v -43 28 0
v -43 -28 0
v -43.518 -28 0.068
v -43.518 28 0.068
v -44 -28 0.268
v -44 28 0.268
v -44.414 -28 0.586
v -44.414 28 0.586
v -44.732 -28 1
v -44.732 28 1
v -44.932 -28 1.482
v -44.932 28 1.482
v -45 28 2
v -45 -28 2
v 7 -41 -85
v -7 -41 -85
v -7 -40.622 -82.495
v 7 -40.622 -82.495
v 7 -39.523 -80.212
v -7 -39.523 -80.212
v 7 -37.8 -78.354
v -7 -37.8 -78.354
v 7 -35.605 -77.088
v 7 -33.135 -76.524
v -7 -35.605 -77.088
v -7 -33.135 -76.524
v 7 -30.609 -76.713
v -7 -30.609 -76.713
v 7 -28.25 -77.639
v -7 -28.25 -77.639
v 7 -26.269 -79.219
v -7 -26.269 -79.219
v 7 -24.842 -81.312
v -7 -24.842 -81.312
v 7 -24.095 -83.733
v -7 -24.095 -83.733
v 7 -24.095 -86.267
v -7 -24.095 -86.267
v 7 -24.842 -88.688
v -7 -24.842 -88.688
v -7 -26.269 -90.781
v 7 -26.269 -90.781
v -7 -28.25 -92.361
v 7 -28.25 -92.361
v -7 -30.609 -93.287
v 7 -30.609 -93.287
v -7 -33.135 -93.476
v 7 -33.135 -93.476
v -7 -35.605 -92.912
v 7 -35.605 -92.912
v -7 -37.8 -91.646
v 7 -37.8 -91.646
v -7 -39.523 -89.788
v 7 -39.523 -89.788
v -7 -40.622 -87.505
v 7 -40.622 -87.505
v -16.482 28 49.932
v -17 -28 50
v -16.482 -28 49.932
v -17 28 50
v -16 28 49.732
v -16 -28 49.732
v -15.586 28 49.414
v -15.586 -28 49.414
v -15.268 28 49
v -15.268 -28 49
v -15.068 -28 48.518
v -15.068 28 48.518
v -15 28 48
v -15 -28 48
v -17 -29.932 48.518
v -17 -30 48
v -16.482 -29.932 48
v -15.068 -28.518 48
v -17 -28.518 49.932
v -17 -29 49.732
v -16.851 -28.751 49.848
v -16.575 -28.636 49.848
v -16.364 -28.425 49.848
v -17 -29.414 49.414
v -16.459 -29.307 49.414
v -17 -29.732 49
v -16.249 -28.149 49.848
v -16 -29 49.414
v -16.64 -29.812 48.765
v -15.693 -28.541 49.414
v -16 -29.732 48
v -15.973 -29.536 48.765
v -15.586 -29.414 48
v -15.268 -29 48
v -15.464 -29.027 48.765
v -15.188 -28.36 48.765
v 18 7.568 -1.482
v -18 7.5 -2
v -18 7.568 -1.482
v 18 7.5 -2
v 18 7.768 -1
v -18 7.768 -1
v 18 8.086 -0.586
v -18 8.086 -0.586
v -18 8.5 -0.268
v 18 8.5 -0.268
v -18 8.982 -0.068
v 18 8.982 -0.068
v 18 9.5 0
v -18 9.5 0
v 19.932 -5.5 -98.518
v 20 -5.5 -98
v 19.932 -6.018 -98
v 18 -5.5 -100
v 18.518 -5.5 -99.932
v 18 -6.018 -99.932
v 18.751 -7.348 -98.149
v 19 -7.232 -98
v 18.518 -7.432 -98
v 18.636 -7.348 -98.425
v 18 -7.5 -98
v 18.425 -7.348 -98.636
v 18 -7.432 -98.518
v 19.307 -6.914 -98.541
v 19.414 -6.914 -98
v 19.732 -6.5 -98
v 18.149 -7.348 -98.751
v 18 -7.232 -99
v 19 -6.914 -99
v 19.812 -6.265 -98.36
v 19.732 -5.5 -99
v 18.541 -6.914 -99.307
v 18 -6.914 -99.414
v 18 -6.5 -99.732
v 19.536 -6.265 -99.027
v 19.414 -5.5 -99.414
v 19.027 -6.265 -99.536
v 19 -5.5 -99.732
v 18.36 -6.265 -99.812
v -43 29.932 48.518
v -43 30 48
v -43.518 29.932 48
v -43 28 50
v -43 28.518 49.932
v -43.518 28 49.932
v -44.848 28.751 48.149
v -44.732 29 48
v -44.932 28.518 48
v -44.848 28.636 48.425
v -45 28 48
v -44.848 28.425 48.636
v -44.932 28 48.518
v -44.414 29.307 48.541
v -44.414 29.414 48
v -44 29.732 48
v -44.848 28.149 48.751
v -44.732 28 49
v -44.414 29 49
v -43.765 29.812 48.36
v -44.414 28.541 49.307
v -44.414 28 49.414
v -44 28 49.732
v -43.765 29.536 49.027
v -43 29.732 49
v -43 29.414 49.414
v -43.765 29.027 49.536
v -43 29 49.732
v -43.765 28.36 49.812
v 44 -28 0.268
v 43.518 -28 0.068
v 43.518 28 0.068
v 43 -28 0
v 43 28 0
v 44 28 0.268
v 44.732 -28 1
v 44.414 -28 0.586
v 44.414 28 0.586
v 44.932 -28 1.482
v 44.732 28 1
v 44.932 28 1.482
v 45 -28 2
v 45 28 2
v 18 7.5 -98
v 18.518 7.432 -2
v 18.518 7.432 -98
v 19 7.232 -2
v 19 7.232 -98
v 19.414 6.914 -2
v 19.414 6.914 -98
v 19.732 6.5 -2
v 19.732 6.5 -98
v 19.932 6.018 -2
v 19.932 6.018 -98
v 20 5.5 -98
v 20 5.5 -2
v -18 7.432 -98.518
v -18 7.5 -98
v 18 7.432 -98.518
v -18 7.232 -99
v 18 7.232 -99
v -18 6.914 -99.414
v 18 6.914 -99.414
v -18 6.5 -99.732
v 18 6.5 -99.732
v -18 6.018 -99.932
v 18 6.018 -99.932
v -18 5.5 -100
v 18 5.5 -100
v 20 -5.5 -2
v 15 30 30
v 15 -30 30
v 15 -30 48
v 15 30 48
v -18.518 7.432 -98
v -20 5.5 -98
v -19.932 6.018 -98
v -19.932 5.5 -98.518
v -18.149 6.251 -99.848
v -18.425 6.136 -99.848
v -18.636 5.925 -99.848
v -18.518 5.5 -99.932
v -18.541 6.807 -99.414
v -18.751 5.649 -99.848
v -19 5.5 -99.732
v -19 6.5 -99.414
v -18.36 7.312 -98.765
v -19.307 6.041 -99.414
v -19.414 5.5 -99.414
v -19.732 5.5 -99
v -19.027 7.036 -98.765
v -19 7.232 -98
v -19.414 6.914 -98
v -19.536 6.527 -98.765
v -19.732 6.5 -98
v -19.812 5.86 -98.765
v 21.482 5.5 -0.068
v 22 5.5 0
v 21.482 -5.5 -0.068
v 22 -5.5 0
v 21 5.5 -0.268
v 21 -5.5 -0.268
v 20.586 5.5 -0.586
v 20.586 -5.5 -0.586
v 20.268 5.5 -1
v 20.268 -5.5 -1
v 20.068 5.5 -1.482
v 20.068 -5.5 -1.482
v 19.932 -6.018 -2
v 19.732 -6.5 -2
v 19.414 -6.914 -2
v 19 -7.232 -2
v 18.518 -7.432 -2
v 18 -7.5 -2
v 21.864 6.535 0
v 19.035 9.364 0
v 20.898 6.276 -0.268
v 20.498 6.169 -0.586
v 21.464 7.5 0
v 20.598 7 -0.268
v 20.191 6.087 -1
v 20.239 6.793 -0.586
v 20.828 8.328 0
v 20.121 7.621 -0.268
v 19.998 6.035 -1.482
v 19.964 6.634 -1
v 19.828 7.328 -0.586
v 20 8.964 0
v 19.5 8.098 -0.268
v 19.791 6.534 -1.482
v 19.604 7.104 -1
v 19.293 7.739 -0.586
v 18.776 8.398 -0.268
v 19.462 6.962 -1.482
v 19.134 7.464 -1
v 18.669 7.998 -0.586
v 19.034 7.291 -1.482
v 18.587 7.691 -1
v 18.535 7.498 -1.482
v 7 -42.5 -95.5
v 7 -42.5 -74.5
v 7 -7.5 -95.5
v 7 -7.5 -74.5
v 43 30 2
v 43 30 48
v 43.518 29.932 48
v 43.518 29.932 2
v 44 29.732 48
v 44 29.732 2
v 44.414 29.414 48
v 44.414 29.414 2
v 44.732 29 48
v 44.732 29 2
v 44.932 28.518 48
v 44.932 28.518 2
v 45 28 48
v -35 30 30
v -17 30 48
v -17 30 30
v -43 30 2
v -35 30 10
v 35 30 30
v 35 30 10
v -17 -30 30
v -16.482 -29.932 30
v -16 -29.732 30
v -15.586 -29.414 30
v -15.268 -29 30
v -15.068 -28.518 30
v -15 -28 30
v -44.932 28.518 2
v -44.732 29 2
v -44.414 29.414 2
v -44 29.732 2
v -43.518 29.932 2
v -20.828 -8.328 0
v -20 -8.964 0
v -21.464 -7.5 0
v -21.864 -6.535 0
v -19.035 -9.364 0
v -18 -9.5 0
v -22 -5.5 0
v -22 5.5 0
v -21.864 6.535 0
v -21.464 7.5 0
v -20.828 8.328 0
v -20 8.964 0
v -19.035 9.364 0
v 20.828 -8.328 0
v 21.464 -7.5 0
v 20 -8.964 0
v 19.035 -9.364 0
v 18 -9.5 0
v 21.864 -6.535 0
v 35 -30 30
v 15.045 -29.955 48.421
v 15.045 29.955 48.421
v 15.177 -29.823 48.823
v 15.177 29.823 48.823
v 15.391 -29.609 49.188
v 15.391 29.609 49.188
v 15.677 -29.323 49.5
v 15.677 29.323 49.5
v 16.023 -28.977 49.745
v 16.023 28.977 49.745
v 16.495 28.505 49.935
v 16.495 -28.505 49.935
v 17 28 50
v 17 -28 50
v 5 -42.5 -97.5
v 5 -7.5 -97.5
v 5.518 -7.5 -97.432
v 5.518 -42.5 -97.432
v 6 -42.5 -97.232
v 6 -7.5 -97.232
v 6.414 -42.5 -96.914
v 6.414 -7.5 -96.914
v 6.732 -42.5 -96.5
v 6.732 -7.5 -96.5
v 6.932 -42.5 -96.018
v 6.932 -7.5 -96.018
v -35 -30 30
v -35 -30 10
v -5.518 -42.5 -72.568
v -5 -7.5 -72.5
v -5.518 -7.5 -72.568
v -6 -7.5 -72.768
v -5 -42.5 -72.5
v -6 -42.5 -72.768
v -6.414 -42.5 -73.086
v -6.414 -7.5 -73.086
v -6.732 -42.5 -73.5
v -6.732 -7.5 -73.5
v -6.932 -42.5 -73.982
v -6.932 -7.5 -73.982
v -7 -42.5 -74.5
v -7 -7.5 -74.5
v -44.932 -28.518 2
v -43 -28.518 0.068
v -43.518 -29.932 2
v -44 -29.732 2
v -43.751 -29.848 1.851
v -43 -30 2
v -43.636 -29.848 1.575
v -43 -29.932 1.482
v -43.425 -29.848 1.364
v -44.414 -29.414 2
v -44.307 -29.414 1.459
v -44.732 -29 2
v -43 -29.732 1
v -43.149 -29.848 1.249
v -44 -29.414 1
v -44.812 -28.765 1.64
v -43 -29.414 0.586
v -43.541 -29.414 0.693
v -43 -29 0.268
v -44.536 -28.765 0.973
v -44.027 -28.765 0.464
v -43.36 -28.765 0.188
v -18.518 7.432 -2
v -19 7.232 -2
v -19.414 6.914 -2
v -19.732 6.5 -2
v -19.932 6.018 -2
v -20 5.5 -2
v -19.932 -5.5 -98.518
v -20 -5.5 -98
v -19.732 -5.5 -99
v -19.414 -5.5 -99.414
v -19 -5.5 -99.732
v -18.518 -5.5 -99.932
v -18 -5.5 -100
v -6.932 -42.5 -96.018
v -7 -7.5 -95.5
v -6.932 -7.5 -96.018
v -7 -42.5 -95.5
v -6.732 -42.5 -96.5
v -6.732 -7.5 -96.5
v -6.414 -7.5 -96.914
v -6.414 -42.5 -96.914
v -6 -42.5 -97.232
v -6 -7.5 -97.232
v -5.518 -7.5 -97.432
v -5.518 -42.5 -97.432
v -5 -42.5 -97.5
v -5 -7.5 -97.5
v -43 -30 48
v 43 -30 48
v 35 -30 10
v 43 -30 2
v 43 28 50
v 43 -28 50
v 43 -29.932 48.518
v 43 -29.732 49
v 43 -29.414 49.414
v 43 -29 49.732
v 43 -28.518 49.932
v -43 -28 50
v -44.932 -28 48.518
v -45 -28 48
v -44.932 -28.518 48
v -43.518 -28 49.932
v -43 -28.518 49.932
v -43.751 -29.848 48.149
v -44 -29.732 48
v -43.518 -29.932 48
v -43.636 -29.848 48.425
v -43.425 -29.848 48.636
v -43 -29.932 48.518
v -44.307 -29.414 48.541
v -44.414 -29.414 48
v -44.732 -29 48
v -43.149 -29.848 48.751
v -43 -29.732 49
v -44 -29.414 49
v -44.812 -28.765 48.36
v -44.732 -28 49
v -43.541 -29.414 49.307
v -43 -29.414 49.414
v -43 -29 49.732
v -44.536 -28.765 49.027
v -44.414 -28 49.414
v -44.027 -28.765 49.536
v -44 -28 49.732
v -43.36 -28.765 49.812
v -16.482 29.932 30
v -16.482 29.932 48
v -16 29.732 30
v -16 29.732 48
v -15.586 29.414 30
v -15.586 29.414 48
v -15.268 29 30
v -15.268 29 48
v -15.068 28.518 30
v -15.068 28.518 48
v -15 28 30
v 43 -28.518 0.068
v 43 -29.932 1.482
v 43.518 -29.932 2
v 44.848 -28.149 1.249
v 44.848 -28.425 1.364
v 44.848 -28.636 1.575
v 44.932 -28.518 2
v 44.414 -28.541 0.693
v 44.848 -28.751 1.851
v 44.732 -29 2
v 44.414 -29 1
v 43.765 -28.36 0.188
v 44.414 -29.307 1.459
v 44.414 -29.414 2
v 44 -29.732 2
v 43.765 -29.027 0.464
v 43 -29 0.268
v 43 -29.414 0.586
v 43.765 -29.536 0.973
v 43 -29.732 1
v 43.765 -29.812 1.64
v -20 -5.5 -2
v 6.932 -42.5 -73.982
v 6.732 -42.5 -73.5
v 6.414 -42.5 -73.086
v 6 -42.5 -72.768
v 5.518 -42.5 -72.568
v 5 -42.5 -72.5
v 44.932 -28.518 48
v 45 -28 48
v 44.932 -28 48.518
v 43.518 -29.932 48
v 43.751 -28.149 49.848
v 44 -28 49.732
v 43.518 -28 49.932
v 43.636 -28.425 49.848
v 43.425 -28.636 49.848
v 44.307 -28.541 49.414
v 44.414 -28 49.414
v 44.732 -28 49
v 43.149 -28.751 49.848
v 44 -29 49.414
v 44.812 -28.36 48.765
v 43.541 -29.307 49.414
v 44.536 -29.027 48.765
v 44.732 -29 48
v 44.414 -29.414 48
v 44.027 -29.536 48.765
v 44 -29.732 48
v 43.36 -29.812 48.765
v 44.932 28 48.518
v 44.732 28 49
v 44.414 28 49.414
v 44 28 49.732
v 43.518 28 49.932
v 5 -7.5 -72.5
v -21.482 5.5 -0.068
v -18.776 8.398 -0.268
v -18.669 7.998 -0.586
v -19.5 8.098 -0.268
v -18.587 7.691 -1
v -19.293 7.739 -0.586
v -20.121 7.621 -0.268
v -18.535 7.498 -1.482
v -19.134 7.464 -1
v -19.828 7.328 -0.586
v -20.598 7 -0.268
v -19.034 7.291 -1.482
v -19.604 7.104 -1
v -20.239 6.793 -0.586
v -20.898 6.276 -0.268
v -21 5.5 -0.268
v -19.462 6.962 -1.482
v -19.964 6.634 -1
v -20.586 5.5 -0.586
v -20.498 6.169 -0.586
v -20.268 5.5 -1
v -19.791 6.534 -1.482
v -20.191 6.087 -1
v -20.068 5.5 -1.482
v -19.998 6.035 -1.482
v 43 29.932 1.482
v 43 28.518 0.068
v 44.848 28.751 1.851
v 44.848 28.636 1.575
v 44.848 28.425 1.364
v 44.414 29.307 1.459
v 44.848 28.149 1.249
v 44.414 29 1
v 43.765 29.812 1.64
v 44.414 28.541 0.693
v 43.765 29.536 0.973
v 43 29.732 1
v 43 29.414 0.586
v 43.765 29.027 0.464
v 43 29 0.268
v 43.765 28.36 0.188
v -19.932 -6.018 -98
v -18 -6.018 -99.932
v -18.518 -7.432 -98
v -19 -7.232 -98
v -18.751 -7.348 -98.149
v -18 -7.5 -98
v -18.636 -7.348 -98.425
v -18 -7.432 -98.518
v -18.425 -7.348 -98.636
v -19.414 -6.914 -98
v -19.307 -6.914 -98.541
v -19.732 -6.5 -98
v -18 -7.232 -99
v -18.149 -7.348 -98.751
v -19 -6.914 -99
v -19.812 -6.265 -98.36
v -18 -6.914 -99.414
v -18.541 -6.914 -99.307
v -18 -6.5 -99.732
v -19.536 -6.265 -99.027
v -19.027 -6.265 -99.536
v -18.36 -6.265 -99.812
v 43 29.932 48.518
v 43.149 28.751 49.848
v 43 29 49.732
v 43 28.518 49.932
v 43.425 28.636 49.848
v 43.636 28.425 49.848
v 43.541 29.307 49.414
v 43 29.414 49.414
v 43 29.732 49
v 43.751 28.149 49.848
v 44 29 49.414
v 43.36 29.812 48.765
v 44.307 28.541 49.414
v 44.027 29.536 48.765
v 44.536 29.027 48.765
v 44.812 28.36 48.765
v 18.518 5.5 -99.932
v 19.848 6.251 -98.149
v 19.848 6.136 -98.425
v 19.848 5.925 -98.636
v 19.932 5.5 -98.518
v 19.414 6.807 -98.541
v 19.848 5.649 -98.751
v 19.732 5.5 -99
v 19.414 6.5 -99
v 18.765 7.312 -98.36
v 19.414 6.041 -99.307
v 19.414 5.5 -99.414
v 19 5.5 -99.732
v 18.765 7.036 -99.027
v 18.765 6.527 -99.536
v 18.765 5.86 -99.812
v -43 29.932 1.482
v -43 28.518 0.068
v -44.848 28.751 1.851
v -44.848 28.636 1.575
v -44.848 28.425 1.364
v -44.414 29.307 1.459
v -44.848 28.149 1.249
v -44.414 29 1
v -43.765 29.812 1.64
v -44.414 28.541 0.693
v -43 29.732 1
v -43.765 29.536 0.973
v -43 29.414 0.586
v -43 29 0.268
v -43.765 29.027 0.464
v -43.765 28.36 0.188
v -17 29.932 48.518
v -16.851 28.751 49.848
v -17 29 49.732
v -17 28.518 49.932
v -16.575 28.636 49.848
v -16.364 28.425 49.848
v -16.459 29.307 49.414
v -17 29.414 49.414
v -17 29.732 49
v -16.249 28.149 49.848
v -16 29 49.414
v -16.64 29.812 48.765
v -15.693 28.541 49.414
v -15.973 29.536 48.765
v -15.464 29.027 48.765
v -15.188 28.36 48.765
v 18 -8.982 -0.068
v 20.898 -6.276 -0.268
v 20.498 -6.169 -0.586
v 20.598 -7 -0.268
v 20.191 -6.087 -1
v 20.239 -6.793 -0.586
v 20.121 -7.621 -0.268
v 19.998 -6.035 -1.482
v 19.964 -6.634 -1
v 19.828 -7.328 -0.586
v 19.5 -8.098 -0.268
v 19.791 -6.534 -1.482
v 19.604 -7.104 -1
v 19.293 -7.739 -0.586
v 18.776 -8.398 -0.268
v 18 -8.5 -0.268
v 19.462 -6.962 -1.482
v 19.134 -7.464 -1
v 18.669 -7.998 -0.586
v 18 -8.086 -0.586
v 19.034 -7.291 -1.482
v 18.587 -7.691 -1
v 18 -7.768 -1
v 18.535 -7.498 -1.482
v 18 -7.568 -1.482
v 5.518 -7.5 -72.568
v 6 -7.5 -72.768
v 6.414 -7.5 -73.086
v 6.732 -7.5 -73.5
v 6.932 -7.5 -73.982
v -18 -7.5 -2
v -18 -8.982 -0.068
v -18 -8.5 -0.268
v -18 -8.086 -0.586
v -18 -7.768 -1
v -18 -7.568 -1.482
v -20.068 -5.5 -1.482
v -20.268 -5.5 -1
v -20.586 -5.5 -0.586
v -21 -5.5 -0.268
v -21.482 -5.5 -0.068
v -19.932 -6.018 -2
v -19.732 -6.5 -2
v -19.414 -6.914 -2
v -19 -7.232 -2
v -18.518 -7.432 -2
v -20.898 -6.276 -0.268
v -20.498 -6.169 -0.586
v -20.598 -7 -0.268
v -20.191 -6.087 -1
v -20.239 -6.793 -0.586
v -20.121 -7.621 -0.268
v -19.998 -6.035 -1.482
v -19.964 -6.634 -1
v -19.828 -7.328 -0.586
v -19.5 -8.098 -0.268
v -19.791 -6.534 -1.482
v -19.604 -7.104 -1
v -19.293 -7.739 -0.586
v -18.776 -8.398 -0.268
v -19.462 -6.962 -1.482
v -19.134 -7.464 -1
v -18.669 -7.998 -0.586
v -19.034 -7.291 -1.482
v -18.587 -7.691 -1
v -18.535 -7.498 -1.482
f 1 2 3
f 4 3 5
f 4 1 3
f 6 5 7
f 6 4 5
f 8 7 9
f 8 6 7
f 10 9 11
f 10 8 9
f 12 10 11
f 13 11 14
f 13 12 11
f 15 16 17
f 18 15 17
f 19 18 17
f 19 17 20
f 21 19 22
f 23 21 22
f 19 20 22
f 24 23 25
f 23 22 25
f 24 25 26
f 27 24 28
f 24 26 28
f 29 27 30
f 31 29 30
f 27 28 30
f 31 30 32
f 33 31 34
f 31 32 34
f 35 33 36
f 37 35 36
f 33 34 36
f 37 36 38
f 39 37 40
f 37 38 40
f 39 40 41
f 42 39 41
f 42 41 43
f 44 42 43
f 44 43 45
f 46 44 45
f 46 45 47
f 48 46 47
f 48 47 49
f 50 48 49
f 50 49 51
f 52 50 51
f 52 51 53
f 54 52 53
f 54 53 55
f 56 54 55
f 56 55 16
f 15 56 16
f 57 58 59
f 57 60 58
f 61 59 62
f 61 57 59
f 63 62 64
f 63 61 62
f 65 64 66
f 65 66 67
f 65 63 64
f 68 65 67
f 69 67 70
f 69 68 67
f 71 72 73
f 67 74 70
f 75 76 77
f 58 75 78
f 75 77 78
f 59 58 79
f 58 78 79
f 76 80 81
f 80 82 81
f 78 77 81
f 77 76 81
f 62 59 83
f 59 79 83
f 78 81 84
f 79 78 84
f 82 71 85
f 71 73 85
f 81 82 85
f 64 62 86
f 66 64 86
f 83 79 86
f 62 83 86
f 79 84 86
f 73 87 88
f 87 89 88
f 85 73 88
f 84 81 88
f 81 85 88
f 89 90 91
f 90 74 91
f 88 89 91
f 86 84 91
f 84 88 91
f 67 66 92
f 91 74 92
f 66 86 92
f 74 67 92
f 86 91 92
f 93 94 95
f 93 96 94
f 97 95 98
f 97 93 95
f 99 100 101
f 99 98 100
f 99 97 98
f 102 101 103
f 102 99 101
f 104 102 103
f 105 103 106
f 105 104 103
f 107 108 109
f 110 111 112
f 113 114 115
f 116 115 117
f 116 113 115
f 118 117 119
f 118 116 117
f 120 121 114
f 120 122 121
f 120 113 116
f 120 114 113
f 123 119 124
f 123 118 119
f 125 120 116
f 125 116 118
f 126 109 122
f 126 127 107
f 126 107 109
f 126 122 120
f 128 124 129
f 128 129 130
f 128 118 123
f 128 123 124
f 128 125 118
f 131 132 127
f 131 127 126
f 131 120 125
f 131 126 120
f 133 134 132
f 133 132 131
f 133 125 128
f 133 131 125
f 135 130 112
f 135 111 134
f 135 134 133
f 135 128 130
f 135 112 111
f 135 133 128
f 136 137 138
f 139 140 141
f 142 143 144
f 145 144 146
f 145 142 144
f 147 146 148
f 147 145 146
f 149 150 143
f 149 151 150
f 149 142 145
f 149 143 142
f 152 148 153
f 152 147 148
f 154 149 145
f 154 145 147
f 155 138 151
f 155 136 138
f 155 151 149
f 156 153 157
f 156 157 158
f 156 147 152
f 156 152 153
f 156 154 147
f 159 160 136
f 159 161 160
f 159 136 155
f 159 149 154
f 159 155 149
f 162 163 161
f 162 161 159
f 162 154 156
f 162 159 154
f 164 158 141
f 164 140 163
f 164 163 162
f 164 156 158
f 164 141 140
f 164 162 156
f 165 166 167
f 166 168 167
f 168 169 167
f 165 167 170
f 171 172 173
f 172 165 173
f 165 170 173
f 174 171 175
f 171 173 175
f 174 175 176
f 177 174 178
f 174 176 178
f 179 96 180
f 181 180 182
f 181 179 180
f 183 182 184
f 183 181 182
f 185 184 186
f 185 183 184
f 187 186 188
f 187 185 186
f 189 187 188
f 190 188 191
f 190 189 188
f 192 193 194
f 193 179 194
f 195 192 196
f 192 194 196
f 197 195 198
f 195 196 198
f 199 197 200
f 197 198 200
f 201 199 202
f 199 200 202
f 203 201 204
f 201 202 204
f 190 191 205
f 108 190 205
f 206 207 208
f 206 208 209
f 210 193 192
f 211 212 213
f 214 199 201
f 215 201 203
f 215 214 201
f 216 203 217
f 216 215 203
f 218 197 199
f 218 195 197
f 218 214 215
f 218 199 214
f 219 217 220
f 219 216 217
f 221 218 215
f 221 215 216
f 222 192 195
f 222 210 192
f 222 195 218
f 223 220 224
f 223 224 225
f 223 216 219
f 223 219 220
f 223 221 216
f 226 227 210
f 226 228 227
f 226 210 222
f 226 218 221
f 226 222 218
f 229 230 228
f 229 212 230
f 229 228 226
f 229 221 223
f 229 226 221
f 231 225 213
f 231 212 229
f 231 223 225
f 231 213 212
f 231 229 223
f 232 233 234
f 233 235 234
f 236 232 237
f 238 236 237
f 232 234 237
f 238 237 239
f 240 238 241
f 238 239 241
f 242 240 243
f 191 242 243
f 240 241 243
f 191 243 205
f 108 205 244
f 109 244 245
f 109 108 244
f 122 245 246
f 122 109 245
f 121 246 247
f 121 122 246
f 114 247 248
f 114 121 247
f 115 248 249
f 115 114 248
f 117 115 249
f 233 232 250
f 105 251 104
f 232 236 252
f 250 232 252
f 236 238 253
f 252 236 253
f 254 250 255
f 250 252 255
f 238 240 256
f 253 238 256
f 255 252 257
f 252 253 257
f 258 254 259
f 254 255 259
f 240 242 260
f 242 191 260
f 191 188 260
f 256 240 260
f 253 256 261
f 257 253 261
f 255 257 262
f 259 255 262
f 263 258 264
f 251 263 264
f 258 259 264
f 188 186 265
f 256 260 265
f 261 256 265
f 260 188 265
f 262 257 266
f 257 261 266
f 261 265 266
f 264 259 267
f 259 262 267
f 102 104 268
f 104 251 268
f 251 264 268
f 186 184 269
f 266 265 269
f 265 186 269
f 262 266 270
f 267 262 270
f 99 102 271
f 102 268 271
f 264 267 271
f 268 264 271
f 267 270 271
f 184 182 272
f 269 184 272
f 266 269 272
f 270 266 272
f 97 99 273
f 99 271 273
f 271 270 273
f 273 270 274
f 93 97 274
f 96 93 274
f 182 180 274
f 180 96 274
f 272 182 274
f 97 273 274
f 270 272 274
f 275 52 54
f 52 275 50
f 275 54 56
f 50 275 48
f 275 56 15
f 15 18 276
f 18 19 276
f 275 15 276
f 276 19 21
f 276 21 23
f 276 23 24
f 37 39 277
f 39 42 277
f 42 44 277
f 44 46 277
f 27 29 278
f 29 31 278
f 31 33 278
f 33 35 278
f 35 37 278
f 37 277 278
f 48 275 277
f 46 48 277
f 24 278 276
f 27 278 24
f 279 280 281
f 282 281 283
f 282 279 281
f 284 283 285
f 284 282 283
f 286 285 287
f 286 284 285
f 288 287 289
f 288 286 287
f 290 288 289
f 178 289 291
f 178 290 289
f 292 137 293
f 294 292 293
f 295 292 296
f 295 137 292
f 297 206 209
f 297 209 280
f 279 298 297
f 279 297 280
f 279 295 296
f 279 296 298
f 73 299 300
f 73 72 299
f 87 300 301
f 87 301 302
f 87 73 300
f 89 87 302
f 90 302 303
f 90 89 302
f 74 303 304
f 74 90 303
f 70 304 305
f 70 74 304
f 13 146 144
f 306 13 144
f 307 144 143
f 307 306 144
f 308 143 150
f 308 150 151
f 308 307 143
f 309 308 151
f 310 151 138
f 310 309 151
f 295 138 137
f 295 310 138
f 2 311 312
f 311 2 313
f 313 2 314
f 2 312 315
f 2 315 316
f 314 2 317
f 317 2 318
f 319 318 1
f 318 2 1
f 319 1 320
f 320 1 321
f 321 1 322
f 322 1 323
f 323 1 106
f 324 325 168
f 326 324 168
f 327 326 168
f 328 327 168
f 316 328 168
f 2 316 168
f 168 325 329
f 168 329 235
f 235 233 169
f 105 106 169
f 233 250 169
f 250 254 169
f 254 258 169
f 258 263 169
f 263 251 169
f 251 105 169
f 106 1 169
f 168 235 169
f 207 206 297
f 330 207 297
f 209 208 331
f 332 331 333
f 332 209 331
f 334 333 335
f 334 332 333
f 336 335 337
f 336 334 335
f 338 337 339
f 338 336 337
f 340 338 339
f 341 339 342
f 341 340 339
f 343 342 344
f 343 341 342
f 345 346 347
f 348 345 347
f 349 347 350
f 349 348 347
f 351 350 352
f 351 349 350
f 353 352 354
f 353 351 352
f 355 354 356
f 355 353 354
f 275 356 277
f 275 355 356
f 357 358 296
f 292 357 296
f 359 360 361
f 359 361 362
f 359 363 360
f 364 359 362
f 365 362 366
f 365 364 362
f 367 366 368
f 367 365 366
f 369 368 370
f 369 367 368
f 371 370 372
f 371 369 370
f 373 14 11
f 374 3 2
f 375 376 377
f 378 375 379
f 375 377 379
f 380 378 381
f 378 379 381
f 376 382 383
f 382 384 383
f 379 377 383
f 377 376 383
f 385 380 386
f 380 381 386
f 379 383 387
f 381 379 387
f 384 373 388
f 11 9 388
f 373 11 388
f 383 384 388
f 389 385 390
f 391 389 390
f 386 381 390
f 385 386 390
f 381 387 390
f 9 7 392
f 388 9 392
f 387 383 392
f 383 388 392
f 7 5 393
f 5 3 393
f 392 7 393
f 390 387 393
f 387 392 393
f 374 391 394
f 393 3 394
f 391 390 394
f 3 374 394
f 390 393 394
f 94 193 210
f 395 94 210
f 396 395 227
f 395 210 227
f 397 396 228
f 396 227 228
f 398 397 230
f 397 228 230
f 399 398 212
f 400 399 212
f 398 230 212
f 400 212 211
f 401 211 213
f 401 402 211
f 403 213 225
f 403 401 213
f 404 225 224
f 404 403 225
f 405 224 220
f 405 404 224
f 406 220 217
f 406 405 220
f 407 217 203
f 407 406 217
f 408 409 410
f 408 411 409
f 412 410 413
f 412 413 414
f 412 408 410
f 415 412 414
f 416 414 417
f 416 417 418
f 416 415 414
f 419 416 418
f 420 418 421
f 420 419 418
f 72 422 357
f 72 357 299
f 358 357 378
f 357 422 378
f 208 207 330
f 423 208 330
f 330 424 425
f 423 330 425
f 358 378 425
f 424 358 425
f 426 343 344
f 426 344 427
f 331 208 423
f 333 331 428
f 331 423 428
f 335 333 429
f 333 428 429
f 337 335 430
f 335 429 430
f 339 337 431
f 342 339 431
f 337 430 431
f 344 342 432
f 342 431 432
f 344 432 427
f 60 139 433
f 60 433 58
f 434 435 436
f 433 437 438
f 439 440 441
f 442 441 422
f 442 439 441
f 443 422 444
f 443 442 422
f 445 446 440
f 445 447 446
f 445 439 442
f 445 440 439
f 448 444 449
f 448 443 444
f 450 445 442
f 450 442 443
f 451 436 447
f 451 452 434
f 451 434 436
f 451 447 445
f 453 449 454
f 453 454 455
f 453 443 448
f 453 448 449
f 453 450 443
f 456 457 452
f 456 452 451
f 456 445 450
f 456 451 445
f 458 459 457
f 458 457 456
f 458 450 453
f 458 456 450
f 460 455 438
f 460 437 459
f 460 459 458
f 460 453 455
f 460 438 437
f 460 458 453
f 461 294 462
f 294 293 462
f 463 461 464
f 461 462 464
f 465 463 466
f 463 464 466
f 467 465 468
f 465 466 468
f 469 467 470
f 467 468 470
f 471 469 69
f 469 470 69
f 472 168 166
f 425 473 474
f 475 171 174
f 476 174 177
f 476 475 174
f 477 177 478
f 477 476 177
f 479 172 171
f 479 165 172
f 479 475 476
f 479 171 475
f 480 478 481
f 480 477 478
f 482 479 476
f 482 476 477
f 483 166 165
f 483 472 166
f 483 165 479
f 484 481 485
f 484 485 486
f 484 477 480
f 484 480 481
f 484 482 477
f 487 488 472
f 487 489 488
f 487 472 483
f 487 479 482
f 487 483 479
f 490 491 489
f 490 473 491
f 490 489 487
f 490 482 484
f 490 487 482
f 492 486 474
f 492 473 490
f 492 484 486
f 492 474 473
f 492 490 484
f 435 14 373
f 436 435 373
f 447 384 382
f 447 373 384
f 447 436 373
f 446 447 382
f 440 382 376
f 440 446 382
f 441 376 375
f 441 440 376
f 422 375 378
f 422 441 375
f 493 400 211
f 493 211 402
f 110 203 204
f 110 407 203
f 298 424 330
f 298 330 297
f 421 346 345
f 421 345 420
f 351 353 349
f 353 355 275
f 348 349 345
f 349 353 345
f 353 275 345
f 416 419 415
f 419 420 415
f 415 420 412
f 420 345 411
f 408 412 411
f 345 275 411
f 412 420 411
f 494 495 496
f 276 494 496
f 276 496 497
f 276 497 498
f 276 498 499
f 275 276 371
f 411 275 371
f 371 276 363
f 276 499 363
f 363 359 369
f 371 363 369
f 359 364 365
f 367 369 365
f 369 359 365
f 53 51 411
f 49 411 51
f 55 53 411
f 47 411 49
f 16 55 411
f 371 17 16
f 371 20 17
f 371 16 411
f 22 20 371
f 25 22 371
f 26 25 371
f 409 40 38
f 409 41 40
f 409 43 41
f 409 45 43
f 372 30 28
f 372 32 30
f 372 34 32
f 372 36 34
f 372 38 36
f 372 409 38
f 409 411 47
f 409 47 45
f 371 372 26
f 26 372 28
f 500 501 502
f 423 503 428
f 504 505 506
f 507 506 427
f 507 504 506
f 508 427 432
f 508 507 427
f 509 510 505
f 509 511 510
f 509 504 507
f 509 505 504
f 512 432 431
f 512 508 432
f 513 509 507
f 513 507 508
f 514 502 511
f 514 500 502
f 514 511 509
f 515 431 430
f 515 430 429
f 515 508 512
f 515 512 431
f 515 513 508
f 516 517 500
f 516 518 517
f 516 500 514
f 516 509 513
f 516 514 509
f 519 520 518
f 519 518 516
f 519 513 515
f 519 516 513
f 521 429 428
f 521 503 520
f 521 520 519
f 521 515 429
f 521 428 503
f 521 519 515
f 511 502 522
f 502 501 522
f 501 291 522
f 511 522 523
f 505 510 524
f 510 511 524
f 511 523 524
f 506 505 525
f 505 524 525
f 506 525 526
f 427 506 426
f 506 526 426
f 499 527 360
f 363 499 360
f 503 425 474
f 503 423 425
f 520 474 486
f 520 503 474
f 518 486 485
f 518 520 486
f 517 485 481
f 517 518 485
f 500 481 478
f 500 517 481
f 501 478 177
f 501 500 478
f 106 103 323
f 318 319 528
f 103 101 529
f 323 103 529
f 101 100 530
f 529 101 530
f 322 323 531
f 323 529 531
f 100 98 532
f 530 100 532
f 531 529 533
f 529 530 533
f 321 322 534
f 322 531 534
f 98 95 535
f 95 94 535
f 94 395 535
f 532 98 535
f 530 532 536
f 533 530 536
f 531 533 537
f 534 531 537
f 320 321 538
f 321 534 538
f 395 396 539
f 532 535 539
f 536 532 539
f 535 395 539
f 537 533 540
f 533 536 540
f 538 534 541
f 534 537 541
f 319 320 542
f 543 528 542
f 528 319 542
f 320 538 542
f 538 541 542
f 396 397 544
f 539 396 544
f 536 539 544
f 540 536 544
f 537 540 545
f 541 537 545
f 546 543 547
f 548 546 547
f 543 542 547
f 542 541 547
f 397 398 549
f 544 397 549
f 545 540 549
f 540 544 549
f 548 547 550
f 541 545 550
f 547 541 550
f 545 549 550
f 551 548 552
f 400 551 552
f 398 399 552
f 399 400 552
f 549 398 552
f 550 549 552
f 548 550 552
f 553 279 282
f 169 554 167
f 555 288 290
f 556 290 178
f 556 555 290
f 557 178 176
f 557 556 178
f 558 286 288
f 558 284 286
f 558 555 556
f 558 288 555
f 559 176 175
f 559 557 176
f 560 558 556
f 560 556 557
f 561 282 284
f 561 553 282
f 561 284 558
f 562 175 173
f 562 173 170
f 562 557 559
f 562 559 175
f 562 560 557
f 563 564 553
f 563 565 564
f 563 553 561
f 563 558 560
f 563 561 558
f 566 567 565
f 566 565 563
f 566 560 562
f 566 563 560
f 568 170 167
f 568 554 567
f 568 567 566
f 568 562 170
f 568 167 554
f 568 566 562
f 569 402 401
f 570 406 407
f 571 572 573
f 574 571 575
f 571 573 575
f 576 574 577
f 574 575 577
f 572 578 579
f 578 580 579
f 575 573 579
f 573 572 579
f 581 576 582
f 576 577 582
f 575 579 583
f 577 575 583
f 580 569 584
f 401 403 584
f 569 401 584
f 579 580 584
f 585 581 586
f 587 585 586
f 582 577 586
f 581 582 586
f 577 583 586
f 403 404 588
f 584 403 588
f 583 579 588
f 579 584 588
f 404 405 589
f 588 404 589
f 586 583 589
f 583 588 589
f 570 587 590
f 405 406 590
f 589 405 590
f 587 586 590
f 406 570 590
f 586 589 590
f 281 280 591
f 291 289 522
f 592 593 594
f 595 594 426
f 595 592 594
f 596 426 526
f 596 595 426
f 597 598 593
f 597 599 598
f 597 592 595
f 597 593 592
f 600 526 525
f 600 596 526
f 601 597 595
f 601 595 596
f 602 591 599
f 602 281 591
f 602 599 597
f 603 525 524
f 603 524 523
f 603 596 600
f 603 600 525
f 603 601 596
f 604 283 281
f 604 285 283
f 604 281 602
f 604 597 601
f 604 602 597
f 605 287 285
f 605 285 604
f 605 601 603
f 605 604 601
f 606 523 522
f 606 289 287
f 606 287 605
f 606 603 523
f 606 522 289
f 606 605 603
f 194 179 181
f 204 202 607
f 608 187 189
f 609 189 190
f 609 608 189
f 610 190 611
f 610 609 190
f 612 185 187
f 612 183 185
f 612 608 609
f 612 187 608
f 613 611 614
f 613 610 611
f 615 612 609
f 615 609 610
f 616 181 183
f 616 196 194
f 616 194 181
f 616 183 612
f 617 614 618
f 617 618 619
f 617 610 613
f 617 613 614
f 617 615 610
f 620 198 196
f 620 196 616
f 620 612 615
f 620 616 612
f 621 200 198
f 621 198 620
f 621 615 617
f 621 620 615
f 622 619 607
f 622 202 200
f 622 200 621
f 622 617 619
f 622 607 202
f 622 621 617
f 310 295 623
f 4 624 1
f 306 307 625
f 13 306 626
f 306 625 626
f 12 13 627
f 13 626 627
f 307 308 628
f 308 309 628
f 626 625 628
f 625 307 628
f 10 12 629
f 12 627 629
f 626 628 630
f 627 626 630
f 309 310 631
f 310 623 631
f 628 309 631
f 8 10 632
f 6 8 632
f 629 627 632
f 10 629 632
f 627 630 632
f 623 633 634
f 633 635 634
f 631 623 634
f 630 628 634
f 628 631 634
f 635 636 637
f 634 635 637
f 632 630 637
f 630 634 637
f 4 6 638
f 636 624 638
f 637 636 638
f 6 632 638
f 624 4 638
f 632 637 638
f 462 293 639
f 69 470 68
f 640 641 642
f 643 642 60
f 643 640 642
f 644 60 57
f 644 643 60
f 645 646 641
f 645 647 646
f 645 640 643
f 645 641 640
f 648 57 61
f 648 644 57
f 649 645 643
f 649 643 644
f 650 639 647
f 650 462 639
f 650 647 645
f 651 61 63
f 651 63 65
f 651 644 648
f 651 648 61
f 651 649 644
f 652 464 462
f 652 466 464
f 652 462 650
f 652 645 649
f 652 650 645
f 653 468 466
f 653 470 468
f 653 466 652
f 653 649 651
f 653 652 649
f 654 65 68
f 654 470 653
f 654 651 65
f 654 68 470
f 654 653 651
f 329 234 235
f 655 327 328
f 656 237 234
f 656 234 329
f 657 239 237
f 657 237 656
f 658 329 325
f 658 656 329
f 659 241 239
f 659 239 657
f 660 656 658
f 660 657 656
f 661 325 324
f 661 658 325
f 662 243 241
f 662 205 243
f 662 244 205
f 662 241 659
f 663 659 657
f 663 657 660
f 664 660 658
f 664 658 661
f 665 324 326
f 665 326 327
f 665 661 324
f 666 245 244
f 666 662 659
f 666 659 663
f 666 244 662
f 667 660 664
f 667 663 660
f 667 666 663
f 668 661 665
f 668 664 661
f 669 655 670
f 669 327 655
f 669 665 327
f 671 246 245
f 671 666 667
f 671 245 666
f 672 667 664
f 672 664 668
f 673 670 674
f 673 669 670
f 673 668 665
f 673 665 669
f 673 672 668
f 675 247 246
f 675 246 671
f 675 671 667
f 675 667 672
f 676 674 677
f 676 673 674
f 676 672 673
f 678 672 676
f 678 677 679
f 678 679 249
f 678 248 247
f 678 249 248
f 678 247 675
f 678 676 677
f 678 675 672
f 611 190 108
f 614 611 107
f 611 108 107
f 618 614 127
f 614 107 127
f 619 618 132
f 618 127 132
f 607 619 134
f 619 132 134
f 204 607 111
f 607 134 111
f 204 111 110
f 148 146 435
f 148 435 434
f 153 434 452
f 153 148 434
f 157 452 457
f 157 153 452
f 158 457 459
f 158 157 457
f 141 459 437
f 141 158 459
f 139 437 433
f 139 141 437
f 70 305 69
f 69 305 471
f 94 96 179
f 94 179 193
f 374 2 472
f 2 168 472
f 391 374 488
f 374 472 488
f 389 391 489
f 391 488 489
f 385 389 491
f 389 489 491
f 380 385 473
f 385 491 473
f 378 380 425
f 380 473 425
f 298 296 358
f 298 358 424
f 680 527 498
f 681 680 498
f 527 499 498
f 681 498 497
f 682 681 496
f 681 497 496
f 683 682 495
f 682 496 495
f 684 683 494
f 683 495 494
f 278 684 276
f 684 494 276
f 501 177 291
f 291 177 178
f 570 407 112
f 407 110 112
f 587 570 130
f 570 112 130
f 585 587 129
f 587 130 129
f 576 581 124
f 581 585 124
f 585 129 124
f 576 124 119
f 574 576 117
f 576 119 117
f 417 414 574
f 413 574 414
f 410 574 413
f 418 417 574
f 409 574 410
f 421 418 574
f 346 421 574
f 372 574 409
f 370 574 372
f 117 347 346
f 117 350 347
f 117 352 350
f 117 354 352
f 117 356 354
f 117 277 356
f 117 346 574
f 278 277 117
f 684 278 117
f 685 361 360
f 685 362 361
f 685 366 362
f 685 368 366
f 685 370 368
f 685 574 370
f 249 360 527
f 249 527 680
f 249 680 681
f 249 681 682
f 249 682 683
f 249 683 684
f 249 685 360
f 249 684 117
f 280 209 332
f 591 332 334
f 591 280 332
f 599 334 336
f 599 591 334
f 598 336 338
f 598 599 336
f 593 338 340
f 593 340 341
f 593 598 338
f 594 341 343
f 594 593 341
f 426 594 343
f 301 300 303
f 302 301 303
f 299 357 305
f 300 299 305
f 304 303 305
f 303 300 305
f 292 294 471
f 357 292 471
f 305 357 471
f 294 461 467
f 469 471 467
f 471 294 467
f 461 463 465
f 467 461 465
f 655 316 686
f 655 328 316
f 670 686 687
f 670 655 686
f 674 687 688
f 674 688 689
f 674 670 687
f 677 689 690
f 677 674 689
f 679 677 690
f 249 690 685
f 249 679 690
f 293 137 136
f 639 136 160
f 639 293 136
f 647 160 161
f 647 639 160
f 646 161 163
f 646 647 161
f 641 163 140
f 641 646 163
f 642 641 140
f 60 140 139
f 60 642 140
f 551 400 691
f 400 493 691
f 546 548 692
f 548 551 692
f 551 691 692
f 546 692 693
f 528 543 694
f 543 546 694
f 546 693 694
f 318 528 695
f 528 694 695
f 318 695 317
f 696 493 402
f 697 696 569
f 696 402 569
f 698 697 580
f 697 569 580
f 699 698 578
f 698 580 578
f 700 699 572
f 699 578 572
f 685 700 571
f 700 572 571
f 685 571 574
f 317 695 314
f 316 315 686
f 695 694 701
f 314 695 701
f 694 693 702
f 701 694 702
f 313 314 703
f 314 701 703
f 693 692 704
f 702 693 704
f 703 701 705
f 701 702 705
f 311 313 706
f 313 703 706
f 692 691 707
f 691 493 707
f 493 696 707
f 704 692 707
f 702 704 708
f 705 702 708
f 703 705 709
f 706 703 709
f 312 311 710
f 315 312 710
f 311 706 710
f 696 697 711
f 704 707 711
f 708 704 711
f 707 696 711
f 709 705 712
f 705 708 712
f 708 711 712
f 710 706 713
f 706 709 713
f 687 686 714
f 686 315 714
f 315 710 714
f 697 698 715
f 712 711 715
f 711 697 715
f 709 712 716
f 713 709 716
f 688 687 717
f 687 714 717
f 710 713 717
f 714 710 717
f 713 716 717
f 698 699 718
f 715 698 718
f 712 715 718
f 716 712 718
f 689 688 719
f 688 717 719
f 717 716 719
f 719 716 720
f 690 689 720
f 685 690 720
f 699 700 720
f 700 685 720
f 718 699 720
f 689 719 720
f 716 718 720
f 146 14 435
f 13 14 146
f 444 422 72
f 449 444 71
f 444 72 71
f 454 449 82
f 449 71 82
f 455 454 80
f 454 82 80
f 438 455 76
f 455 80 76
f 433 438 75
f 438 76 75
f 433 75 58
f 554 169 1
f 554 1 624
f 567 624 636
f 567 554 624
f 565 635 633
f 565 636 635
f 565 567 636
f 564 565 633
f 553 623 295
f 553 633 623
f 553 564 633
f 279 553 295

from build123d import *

# Parameters (mm, degrees)
F0_W      = 90
F0_H      = 60
F1_DEPTH  = 10
F2_W      = 10
F2_H      = 60
F3_DEPTH  = 20
F5_W      = 30
F5_H      = 60
F6_DEPTH  = 20
F4_W      = 30
F4_H      = 60
F7_DEPTH  = 20
F8_W      = 40
F8_H      = 15
F9_DEPTH  = 100
F10_W     = 14
F10_H     = 25
F11_DEPTH = 50
F12_R     = 8.5
F13_DEPTH = 52.001
F14_R     = 2


with BuildPart() as f1:
    # F0 (on Top) → F1 (new body)
    with BuildSketch(Plane.XY):
        Rectangle(F0_W, F0_H)
    extrude(amount=F1_DEPTH)

    # F2 (on face) → F3 (join)
    with BuildSketch(Plane.XY.offset(10)):
        with Locations((-40, 0)):
            Rectangle(F2_W, F2_H)
        with Locations((40, 0)):
            Rectangle(F2_W, F2_H)
    extrude(amount=F3_DEPTH)

    # F5 (on face) → F6 (join)
    with BuildSketch(Plane.XY.offset(30)):
        with Locations((30, 0)):
            Rectangle(F5_W, F5_H)
    extrude(amount=F6_DEPTH)

    # F4 (on face) → F7 (join)
    with BuildSketch(Plane.XY.offset(30)):
        with Locations((-30, 0)):
            Rectangle(F4_W, F4_H)
    extrude(amount=F7_DEPTH)

    # F8 (on face) → F9 (join)
    with BuildSketch(Plane(origin=(0, 0, 0), x_dir=(1, 0, 0), z_dir=(0, 0, -1))):
        Rectangle(F8_W, F8_H)
    extrude(amount=F9_DEPTH)

    # F10 (on face) → F11 (join)
    with BuildSketch(Plane(origin=(0, 7.5, 0), x_dir=(-1, 0, 0), z_dir=(0, 1, 0))):
        with Locations((0, -85)):
            Rectangle(F10_W, F10_H)
    extrude(amount=-F11_DEPTH)

    # F12 (on face) → F13 (cut, through all)
    with BuildSketch(Plane(origin=(-7, 0, 0), x_dir=(0, -1, 0), z_dir=(-1, 0, 0))):
        with Locations((32.5, -85)):
            Circle(F12_R)
    extrude(amount=-F13_DEPTH, mode=Mode.SUBTRACT)

    # F14
    f14_edges = [f1.edges().sort_by_distance(p)[0] for p in [
        (-20, 7.5, -50),
        (0, 7.5, -100),
        (20, 7.5, -50),
        (20, 0, -100),
        (-20, 0, -100),
        (-20, -7.5, -50),
        (20, -7.5, -50),
        (20, 0, 0),
        (0, -7.5, -100),
        (0, 30, 0),
        (45, 30, 25),
        (30, 30, 50),
        (-15, 30, 40),
        (-30, 30, 50),
        (-45, 30, 25),
        (-45, 0, 0),
        (-45, 0, 50),
        (-45, -30, 25),
        (0, -30, 0),
        (45, 0, 0),
        (45, -30, 25),
        (45, 0, 50),
        (30, -30, 50),
        (-15, -30, 40),
        (-30, -30, 50),
        (-15, 0, 50),
        (15, 0, 50),
        (-7, -25, -97.5),
        (-7, -25, -72.5),
        (7, -25, -97.5),
        (7, -25, -72.5),
        (0, 7.5, 0),
        (-20, 0, 0),
        (0, -7.5, 0),
    ]]
    fillet(f14_edges, radius=F14_R)


solid = f1.part
